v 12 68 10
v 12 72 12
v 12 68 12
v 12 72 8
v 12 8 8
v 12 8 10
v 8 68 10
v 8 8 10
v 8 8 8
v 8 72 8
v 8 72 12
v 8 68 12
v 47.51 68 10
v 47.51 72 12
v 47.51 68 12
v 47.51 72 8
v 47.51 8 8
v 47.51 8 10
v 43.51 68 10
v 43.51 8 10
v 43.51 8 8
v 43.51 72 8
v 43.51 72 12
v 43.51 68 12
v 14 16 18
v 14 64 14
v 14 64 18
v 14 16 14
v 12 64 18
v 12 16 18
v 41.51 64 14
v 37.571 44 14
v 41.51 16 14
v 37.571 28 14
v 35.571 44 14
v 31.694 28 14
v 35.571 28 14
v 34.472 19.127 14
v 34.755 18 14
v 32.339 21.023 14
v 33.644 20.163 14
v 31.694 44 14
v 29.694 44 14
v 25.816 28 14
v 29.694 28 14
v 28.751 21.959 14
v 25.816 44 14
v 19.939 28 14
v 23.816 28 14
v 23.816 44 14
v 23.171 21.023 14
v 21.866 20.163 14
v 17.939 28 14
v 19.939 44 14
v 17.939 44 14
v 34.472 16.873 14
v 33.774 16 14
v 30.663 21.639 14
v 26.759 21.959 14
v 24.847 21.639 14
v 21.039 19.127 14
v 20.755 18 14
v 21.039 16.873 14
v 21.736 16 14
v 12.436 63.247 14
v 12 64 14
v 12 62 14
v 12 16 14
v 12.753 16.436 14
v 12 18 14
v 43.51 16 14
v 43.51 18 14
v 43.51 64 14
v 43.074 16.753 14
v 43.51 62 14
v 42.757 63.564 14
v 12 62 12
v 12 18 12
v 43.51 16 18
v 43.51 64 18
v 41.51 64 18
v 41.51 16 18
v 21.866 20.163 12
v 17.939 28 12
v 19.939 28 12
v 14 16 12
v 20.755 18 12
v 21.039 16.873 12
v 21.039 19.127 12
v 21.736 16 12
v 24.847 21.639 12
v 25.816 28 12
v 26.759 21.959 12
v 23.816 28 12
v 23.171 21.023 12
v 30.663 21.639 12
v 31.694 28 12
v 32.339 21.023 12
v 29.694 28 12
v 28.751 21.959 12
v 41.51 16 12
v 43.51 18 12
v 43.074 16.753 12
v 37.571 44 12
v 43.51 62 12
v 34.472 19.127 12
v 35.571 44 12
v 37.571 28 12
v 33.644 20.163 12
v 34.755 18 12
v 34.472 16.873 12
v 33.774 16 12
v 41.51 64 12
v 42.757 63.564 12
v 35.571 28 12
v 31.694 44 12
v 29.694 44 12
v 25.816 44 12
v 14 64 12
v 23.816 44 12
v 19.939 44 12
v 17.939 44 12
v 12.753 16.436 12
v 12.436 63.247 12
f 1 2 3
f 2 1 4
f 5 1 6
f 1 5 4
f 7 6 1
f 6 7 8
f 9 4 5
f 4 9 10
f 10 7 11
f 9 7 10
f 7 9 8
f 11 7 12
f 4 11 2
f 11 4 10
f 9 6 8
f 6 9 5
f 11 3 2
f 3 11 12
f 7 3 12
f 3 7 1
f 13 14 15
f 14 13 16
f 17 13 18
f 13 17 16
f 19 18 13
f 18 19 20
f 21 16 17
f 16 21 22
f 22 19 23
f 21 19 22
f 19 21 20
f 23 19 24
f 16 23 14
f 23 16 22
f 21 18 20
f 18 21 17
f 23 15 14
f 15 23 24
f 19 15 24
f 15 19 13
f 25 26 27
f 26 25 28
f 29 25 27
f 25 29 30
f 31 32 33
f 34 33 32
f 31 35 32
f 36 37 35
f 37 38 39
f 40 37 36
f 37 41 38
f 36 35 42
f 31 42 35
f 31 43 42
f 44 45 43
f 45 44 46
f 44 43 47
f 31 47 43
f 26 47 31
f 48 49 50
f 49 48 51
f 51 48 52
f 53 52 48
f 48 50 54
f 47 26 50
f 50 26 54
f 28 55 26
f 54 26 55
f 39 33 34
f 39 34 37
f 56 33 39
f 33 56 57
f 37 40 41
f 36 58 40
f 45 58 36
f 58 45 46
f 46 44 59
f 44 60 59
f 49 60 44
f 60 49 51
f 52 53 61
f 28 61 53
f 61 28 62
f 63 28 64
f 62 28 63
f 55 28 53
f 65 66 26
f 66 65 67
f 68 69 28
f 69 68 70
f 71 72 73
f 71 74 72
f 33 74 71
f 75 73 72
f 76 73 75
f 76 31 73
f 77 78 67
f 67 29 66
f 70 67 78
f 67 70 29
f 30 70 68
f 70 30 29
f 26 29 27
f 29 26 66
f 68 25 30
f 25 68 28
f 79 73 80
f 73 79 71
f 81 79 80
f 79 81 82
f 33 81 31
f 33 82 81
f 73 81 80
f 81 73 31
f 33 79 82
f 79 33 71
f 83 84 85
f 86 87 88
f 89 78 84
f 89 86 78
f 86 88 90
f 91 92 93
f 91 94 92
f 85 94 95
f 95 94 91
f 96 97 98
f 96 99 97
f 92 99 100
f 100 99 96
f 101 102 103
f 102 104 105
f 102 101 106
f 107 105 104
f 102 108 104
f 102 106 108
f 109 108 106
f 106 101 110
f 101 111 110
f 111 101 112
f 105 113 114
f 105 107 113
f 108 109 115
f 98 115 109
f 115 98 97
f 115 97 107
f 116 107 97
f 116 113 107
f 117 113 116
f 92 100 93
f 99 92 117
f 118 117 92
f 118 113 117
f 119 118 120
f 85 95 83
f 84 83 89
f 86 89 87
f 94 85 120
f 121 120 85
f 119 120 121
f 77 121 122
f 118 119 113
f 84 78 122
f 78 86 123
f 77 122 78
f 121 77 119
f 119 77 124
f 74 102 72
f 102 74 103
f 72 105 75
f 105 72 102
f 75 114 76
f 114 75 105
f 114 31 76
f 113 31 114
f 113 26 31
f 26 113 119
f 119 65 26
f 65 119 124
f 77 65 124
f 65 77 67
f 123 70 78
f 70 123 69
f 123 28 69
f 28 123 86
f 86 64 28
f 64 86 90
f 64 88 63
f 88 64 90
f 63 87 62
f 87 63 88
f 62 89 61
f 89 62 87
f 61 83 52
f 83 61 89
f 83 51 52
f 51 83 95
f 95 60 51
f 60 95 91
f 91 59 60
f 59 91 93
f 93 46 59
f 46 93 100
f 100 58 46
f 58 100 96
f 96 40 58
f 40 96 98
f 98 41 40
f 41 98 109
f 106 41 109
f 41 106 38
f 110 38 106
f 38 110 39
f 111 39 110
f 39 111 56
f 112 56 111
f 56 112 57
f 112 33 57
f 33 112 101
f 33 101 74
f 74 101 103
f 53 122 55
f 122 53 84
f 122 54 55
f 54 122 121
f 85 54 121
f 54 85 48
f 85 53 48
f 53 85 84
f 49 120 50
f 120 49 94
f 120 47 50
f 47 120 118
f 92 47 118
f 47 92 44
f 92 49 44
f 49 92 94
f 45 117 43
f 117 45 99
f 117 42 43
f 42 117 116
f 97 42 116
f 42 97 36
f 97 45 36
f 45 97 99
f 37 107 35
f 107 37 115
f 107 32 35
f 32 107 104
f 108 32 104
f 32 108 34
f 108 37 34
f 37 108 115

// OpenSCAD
// file: ../../cutter_lib/joints/cj_hidden_tabs.scad
use <../materials/cm_manufacturing.scad>

// Positions `count` equally spaced features along an edge. Children must be
// 2D geometry centred on their local X origin and extending in +Y.
module cj_edge_pattern(edge_length, count=3, edge_margin=4)
{
    assert(edge_length > 0, "cj_edge_pattern: edge_length must be positive");
    assert(count >= 1 && floor(count) == count,
           "cj_edge_pattern: count must be a positive integer");
    assert(edge_margin >= 0 && 2*edge_margin < edge_length,
           "cj_edge_pattern: edge margins consume the edge");

    pitch = (edge_length - 2*edge_margin) / count;
    assert(pitch > 0, "cj_edge_pattern: feature pitch must be positive");

    for (i = [0:count-1])
        translate([edge_margin + pitch*(i + 0.5), 0])
            children();
}

// Male tabs for a hidden internal edge. `feature_width` is the nominal width
// along the edge, while `tab_depth` is normally the material thickness.
module cj_hidden_tabs_2d(edge_length, tab_depth, feature_width,
                         count=3, edge_margin=4,
                         fit_clearance=0, kerf=0)
{
    drawn_width = tab_width(feature_width, fit_clearance, kerf);
    pitch = (edge_length - 2*edge_margin) / count;

    assert(tab_depth > 0, "cj_hidden_tabs_2d: tab_depth must be positive");
    assert(drawn_width < pitch,
           "cj_hidden_tabs_2d: tabs overlap; reduce width/count or margins");

    cj_edge_pattern(edge_length, count, edge_margin)
        translate([-drawn_width/2, 0])
            square([drawn_width, tab_depth]);
}

// Matching internal slots. Use in a difference() operation.
module cj_hidden_slots_2d(edge_length, material_thickness, feature_width,
                          count=3, edge_margin=4,
                          fit_clearance=0, kerf=0)
{
    drawn_length = slot_width(feature_width, fit_clearance, kerf);
    drawn_depth = slot_width(material_thickness, fit_clearance, kerf);
    pitch = (edge_length - 2*edge_margin) / count;

    assert(drawn_length < pitch,
           "cj_hidden_slots_2d: slots overlap; reduce width/count or margins");

    cj_edge_pattern(edge_length, count, edge_margin)
        translate([-drawn_length/2, -drawn_depth/2])
            square([drawn_length, drawn_depth]);
}

// Adds tabs to one edge of a rectangular panel. The edge may be "bottom",
// "top", "left", or "right". Tabs point away from the panel.
module cj_hidden_tabbed_panel_2d(size, edge="bottom",
                                 tab_depth=4, feature_width=8,
                                 count=3, edge_margin=4,
                                 fit_clearance=0, kerf=0)
{
    assert(size[0] > 0 && size[1] > 0,
           "cj_hidden_tabbed_panel_2d: panel size must be positive");
    assert(edge == "bottom" || edge == "top" ||
           edge == "left" || edge == "right",
           "cj_hidden_tabbed_panel_2d: unsupported edge");

    union() {
        square(size);

        if (edge == "bottom")
            mirror([0,1])
                cj_hidden_tabs_2d(size[0], tab_depth, feature_width,
                                  count, edge_margin, fit_clearance, kerf);
        else if (edge == "top")
            translate([0, size[1]])
                cj_hidden_tabs_2d(size[0], tab_depth, feature_width,
                                  count, edge_margin, fit_clearance, kerf);
        else if (edge == "left")
            rotate([0,0,90])
                cj_hidden_tabs_2d(size[1], tab_depth, feature_width,
                                  count, edge_margin, fit_clearance, kerf);
        else
            translate([size[0], 0])
                rotate([0,0,90])
                    mirror([0,1])
                        cj_hidden_tabs_2d(size[1], tab_depth, feature_width,
                                          count, edge_margin,
                                          fit_clearance, kerf);
    }
}
// file: ../../cutter_lib/materials/cm_manufacturing.scad
// Shared laser-cutting dimensions and compensation helpers.
//
// `kerf` is the full measured cut width. A laser follows the centre of an
// exported contour, so internal openings grow by approximately one kerf while
// external parts shrink by approximately one kerf.

function cut_compensation(kerf) =
    assert(kerf >= 0, "cut_compensation: kerf must be non-negative")
    kerf / 2;

// Drawn width for an internal slot whose finished width should accept the
// material plus the requested clearance.
function slot_width(material_thickness, fit_clearance=0, kerf=0) =
    assert(material_thickness > 0, "slot_width: material_thickness must be positive")
    assert(material_thickness + fit_clearance > kerf,
           "slot_width: kerf is too large for the requested finished slot")
    material_thickness + fit_clearance - kerf;

// Drawn width for an external tab. Positive fit_clearance makes the finished
// tab narrower relative to its matching slot.
function tab_width(material_thickness, fit_clearance=0, kerf=0) =
    assert(material_thickness > 0, "tab_width: material_thickness must be positive")
    assert(material_thickness - fit_clearance + kerf > 0,
           "tab_width: compensation produced a non-positive tab")
    material_thickness - fit_clearance + kerf;

// Compensate an arbitrary target dimension. `internal=true` describes a hole
// or pocket; false describes the outside of a cut part.
function compensated_dimension(target, kerf=0, internal=false) =
    assert(target > 0, "compensated_dimension: target must be positive")
    assert(kerf >= 0, "compensated_dimension: kerf must be non-negative")
    internal ? target - kerf : target + kerf;

function effective_pin_hole_diameter(pin_diameter, pin_clearance=0, kerf=0) =
    assert(pin_diameter > 0,
           "effective_pin_hole_diameter: pin_diameter must be positive")
    assert(pin_diameter + pin_clearance > kerf,
           "effective_pin_hole_diameter: requested hole is smaller than kerf")
    pin_diameter + pin_clearance - kerf;
// file: ../../cutter_lib/shells/csh_ribbed_veneer.scad
// Rib-supported shell primitives for veneer that bends in one direction.

function csh_wrap_length(width, height, corner_radius) =
    assert(width > 2*corner_radius,
           "csh_wrap_length: width must exceed twice the corner radius")
    assert(height > corner_radius,
           "csh_wrap_length: height must exceed the corner radius")
    (width - 2*corner_radius) +
    2*(height - corner_radius) +
    PI*corner_radius;

module csh_rounded_rect_2d(size, radius)
{
    assert(size[0] > 0 && size[1] > 0,
           "csh_rounded_rect_2d: size must be positive");
    assert(radius >= 0 && 2*radius <= min(size[0], size[1]),
           "csh_rounded_rect_2d: invalid radius");

    if (radius == 0)
        square(size);
    else
        translate([radius, radius])
            offset(r=radius)
                square([size[0]-2*radius, size[1]-2*radius]);
}

// Cross-section rib. Optional children are subtracted as registration slots.
module shell_rib(width, height, rib_width=4, corner_radius=6)
{
    assert(rib_width > 0, "shell_rib: rib_width must be positive");
    assert(width > 2*rib_width && height > 2*rib_width,
           "shell_rib: rib width consumes the silhouette");
    assert(corner_radius >= rib_width,
           "shell_rib: corner radius must be at least rib_width");

    difference() {
        csh_rounded_rect_2d([width, height], corner_radius);
        translate([rib_width, rib_width])
            csh_rounded_rect_2d(
                [width-2*rib_width, height-2*rib_width],
                max(0, corner_radius-rib_width));
        children();
    }
}

module veneer_registration_slot(size=[8,4])
{
    assert(size[0] > 0 && size[1] > 0,
           "veneer_registration_slot: size must be positive");
    square(size, center=true);
}

// Flat single-direction veneer development. It represents a wrap over both
// sides and the rounded top; the front and rear remain separate faces.
module veneer_skin_layout(width, height, depth,
                          corner_radius=6,
                          front_termination_offset=4,
                          rear_termination_offset=4,
                          min_bend_radius=5)
{
    skin_depth = depth-front_termination_offset-rear_termination_offset;
    wrap = csh_wrap_length(width, height, corner_radius);

    assert(skin_depth > 0,
           "veneer_skin_layout: termination offsets consume the depth");
    if (corner_radius < min_bend_radius)
        echo(str("[WARNING] veneer_skin_layout: bend radius ",
                 corner_radius, " is below recommended ", min_bend_radius));

    square([wrap, skin_depth]);
}

// 3D preview of ribs and an optional idealised veneer skin. The skin is an
// extrusion of a constant rounded cross-section, so its flat development is
// valid as a one-direction wrap approximation.
module ribbed_veneer_shell(width, height, depth,
                           rib_count=4,
                           rib_thickness=4,
                           rib_width=4,
                           veneer_thickness=0.6,
                           corner_radius=6,
                           front_termination_offset=4,
                           rear_termination_offset=4,
                           show_ribs=true,
                           show_skin=true,
                           min_bend_radius=5,
                           skin_opacity=0.90)
{
    usable_depth = depth-front_termination_offset-rear_termination_offset;

    assert(width > 0 && height > 0 && depth > 0,
           "ribbed_veneer_shell: dimensions must be positive");
    assert(rib_count >= 1 && floor(rib_count) == rib_count,
           "ribbed_veneer_shell: rib_count must be a positive integer");
    assert(usable_depth >= rib_thickness,
           "ribbed_veneer_shell: no room remains for ribs");

    if (corner_radius < min_bend_radius)
        echo(str("[WARNING] ribbed_veneer_shell: bend radius ",
                 corner_radius, " is below recommended ", min_bend_radius));

    if (show_ribs)
        for (i = [0:rib_count-1])
            let(y = rib_count == 1
                ? front_termination_offset
                : front_termination_offset +
                  (usable_depth-rib_thickness)*i/(rib_count-1))
                translate([0, y+rib_thickness, 0])
                    rotate([90,0,0])
                        linear_extrude(rib_thickness)
                            shell_rib(width, height,
                                      rib_width, corner_radius);

    if (show_skin)
        color([0.72, 0.45, 0.2, skin_opacity])
            translate([0, front_termination_offset+usable_depth, 0])
                rotate([90,0,0])
                    linear_extrude(usable_depth)
                        difference() {
                            csh_rounded_rect_2d(
                                [width, height], corner_radius);
                            translate([veneer_thickness,
                                       veneer_thickness])
                                csh_rounded_rect_2d(
                                    [width-2*veneer_thickness,
                                     height-2*veneer_thickness],
                                    max(0, corner_radius-
                                           veneer_thickness));
                        }
}
// file: bob_chamber.scad
use <../../cutter_lib/materials/cm_manufacturing.scad>
use <../../cutter_lib/joints/cj_hidden_tabs.scad>

/* [Example] */

make_3d = true; // [false:true]
example_model_height = 80; // [70:1:160]
example_plywood_thickness = 4; // [1:0.5:8]
example_exploded = 0; // [0:0.5:10]

/* [Hidden] */

example_model_width = 340 * example_model_height / 490;
example_model_depth = example_model_height;
example_chamber_width =
    bob_chamber_width(example_model_width,
                      example_plywood_thickness);
example_chamber_height =
    bob_chamber_height(example_model_height,
                       example_plywood_thickness);
example_chamber_depth =
    bob_chamber_depth(example_model_depth,
                      example_plywood_thickness);

if (make_3d)
    bob_chamber_assembly(
        example_model_width,
        example_model_height,
        example_model_depth,
        example_plywood_thickness,
        example_exploded);
else {
    bob_chamber_floor_2d(
        example_chamber_width,
        example_chamber_depth,
        example_plywood_thickness);
    translate([
        example_chamber_width+
        2*example_plywood_thickness+5, 0])
        bob_chamber_side_2d(
            example_chamber_depth,
            example_chamber_height,
            example_plywood_thickness);
}

function bob_chamber_width(model_width, plywood_thickness) =
    model_width - 4*plywood_thickness;
function bob_chamber_height(model_height, plywood_thickness) =
    model_height - 6*plywood_thickness;
function bob_chamber_depth(model_depth, plywood_thickness) =
    model_depth - 4*plywood_thickness;

module bob_chamber_floor_2d(width, depth,
                            plywood_thickness=4,
                            fit_clearance=0.15,
                            kerf=0.5,
                            tab_count=3)
{
    feature_width = max(7, 2*plywood_thickness);

    union() {
        square([width, depth]);

        // Tabs enter the side supports and remain inside the shell.
        rotate([0,0,90])
            cj_hidden_tabs_2d(
                depth, plywood_thickness, feature_width,
                tab_count, edge_margin=plywood_thickness,
                fit_clearance=fit_clearance, kerf=kerf);
        translate([width, depth])
            rotate([0,0,-90])
                cj_hidden_tabs_2d(
                    depth, plywood_thickness, feature_width,
                    tab_count, edge_margin=plywood_thickness,
                    fit_clearance=fit_clearance, kerf=kerf);
    }
}

module bob_chamber_side_2d(depth, height,
                           plywood_thickness=4,
                           fit_clearance=0.15,
                           kerf=0.5,
                           tab_count=3)
{
    feature_width = max(7, 2*plywood_thickness);

    difference() {
        square([depth, height]);
        translate([0, plywood_thickness/2])
            cj_hidden_slots_2d(
                depth, plywood_thickness, feature_width,
                tab_count, edge_margin=plywood_thickness,
                fit_clearance=fit_clearance, kerf=kerf);
        translate([0, height-plywood_thickness/2])
            cj_hidden_slots_2d(
                depth, plywood_thickness, feature_width,
                tab_count, edge_margin=plywood_thickness,
                fit_clearance=fit_clearance, kerf=kerf);
    }
}

module bob_chamber_assembly(model_width, model_height, model_depth,
                            plywood_thickness=4,
                            exploded=0)
{
    cw = bob_chamber_width(model_width, plywood_thickness);
    ch = bob_chamber_height(model_height, plywood_thickness);
    cd = bob_chamber_depth(model_depth, plywood_thickness);
    x0 = (model_width-cw)/2;
    y0 = 2*plywood_thickness;
    z0 = 2*plywood_thickness;

    assert(cw > 2*plywood_thickness &&
           ch > 2*plywood_thickness &&
           cd > 2*plywood_thickness,
           "bob_chamber_assembly: model is too small for chamber");

    color([0.72, 0.74, 0.72]) {
        // Floor and upper boundary.
        translate([x0, y0, z0-exploded])
            cube([cw, cd, plywood_thickness]);
        translate([x0, y0, z0+ch-plywood_thickness+exploded])
            cube([cw, cd, plywood_thickness]);

        // Rear wall.
        translate([x0, y0+cd-plywood_thickness+exploded,
                   z0])
            cube([cw, plywood_thickness, ch]);

        // Narrow side supports leave the chamber visually open.
        for (x = [x0, x0+cw-plywood_thickness])
            translate([x, y0, z0])
                cube([plywood_thickness, cd, ch]);
    }

    // Simplified spray-arm engraving/preview on the chamber floor.
    color([0.35, 0.38, 0.36])
        translate([model_width/2, y0+cd*0.55,
                   z0+plywood_thickness+0.1])
            linear_extrude(0.4)
                union() {
                    circle(d=3);
                    square([cw*0.55, 1.2], center=true);
                }
}
// file: ../../cutter_lib/trays/ctr_removable_tray.scad
use <../shells/csh_ribbed_veneer.scad>

module finger_grip_2d(width=16, depth=5)
{
    assert(width > depth && depth > 0,
           "finger_grip_2d: width must exceed positive depth");
    scale([1, 2*depth/width])
        circle(d=width);
}

module dish_slot_pattern_2d(area=[30,30], slot_width=2,
                            slot_length=20, count=4, margin=3)
{
    assert(area[0] > 0 && area[1] > 0,
           "dish_slot_pattern_2d: area must be positive");
    assert(count >= 1 && floor(count) == count,
           "dish_slot_pattern_2d: count must be a positive integer");
    assert(slot_width > 0 && slot_length > 0 &&
           slot_length <= area[1]-2*margin,
           "dish_slot_pattern_2d: slots do not fit the area");

    pitch = (area[0]-2*margin)/count;
    assert(slot_width < pitch,
           "dish_slot_pattern_2d: slot width exceeds pitch");

    for (i = [0:count-1])
        translate([margin+pitch*(i+0.5)-slot_width/2,
                   (area[1]-slot_length)/2])
            square([slot_width, slot_length]);
}

module removable_tray_2d(size=[40,50], corner_radius=2,
                         grip_width=14, grip_depth=5,
                         dish_slots=4, dish_slot_width=2)
{
    assert(size[0] > grip_width && size[1] > 2*grip_depth,
           "removable_tray_2d: grip does not fit tray");

    difference() {
        csh_rounded_rect_2d(size, corner_radius);
        translate([size[0]/2, grip_depth/2])
            finger_grip_2d(grip_width, grip_depth);
        dish_slot_pattern_2d(
            [size[0], size[1]-2*grip_depth],
            dish_slot_width,
            size[1]/3,
            dish_slots,
            margin=4);
    }
}

module removable_tray(size=[40,50], thickness=2,
                      corner_radius=2, grip_width=14,
                      grip_depth=5, dish_slots=4,
                      dish_slot_width=2, make_3d=false)
{
    assert(thickness > 0, "removable_tray: thickness must be positive");

    if (make_3d)
        linear_extrude(thickness)
            removable_tray_2d(size, corner_radius, grip_width,
                              grip_depth, dish_slots, dish_slot_width);
    else
        removable_tray_2d(size, corner_radius, grip_width,
                          grip_depth, dish_slots, dish_slot_width);
}

module tray_runner(length, width=4, height=4, stop_height=0,
                   make_3d=true)
{
    assert(length > 0 && width > 0 && height > 0,
           "tray_runner: dimensions must be positive");
    assert(stop_height >= 0,
           "tray_runner: stop_height must be non-negative");

    if (make_3d)
        union() {
            cube([width, length, height]);
            if (stop_height > 0)
                translate([0, length-width, height])
                    cube([width, width, stop_height]);
        }
    else
        square([width, length]);
}
// main file
use <../../cutter_lib/trays/ctr_removable_tray.scad>
use <bob_chamber.scad>

/* [Example] */

make_3d = true; // [false:true]
example_model_height = 80; // [70:1:160]
example_plywood_thickness = 4; // [1:0.5:8]
example_pullout = 0; // [0:1:80]

/* [Hidden] */

example_model_width = 340 * example_model_height / 490;
example_model_depth = example_model_height;
example_rack_size = bob_rack_size(
    example_model_width,
    example_model_depth,
    example_plywood_thickness);

if (make_3d)
    bob_rack_assembly(
        example_model_width,
        example_model_height,
        example_model_depth,
        example_plywood_thickness,
        example_pullout);
else
    removable_tray(
        example_rack_size,
        thickness=example_plywood_thickness/2,
        make_3d=false);

function bob_rack_size(model_width, model_depth, plywood_thickness) =
    [bob_chamber_width(model_width, plywood_thickness)-
     2*plywood_thickness,
     bob_chamber_depth(model_depth, plywood_thickness)-
     4*plywood_thickness];

module bob_rack_assembly(model_width, model_height, model_depth,
                         plywood_thickness=4,
                         pullout=0,
                         removable=true,
                         exploded=0)
{
    chamber_w = bob_chamber_width(model_width, plywood_thickness);
    chamber_d = bob_chamber_depth(model_depth, plywood_thickness);
    rack = bob_rack_size(
        model_width, model_depth, plywood_thickness);
    x0 = (model_width-rack[0])/2;
    y0 = 2*plywood_thickness+2*plywood_thickness-pullout;
    z0 = 3*plywood_thickness+exploded;

    assert(rack[0] > 10 && rack[1] > 10,
           "bob_rack_assembly: rack is too small");
    assert(pullout >= 0,
           "bob_rack_assembly: pullout must be non-negative");
    if (!removable && pullout > 0)
        echo("[WARNING] bob_rack_assembly: pullout ignored conceptually when rack_removable=false");

    // Tray support ledges.
    color([0.60, 0.47, 0.28])
    for (x = [(model_width-chamber_w)/2,
              (model_width+chamber_w)/2-plywood_thickness])
        translate([x, 2*plywood_thickness,
                   z0-plywood_thickness])
            tray_runner(
                chamber_d,
                width=plywood_thickness,
                height=plywood_thickness/2,
                stop_height=plywood_thickness/2,
                make_3d=true);

    color([0.78, 0.62, 0.36])
        translate([x0, y0, z0])
            removable_tray(
                rack,
                thickness=plywood_thickness/2,
                corner_radius=2,
                grip_width=min(14, rack[0]/2),
                grip_depth=4,
                dish_slots=4,
                dish_slot_width=2,
                make_3d=true);

    // Low, robust side rails instead of fragile miniature wire tines.
    color([0.72, 0.54, 0.30])
    for (x = [x0, x0+rack[0]-plywood_thickness/2])
        translate([x, y0, z0+plywood_thickness/2])
            cube([plywood_thickness/2,
                  rack[1], plywood_thickness]);
}
